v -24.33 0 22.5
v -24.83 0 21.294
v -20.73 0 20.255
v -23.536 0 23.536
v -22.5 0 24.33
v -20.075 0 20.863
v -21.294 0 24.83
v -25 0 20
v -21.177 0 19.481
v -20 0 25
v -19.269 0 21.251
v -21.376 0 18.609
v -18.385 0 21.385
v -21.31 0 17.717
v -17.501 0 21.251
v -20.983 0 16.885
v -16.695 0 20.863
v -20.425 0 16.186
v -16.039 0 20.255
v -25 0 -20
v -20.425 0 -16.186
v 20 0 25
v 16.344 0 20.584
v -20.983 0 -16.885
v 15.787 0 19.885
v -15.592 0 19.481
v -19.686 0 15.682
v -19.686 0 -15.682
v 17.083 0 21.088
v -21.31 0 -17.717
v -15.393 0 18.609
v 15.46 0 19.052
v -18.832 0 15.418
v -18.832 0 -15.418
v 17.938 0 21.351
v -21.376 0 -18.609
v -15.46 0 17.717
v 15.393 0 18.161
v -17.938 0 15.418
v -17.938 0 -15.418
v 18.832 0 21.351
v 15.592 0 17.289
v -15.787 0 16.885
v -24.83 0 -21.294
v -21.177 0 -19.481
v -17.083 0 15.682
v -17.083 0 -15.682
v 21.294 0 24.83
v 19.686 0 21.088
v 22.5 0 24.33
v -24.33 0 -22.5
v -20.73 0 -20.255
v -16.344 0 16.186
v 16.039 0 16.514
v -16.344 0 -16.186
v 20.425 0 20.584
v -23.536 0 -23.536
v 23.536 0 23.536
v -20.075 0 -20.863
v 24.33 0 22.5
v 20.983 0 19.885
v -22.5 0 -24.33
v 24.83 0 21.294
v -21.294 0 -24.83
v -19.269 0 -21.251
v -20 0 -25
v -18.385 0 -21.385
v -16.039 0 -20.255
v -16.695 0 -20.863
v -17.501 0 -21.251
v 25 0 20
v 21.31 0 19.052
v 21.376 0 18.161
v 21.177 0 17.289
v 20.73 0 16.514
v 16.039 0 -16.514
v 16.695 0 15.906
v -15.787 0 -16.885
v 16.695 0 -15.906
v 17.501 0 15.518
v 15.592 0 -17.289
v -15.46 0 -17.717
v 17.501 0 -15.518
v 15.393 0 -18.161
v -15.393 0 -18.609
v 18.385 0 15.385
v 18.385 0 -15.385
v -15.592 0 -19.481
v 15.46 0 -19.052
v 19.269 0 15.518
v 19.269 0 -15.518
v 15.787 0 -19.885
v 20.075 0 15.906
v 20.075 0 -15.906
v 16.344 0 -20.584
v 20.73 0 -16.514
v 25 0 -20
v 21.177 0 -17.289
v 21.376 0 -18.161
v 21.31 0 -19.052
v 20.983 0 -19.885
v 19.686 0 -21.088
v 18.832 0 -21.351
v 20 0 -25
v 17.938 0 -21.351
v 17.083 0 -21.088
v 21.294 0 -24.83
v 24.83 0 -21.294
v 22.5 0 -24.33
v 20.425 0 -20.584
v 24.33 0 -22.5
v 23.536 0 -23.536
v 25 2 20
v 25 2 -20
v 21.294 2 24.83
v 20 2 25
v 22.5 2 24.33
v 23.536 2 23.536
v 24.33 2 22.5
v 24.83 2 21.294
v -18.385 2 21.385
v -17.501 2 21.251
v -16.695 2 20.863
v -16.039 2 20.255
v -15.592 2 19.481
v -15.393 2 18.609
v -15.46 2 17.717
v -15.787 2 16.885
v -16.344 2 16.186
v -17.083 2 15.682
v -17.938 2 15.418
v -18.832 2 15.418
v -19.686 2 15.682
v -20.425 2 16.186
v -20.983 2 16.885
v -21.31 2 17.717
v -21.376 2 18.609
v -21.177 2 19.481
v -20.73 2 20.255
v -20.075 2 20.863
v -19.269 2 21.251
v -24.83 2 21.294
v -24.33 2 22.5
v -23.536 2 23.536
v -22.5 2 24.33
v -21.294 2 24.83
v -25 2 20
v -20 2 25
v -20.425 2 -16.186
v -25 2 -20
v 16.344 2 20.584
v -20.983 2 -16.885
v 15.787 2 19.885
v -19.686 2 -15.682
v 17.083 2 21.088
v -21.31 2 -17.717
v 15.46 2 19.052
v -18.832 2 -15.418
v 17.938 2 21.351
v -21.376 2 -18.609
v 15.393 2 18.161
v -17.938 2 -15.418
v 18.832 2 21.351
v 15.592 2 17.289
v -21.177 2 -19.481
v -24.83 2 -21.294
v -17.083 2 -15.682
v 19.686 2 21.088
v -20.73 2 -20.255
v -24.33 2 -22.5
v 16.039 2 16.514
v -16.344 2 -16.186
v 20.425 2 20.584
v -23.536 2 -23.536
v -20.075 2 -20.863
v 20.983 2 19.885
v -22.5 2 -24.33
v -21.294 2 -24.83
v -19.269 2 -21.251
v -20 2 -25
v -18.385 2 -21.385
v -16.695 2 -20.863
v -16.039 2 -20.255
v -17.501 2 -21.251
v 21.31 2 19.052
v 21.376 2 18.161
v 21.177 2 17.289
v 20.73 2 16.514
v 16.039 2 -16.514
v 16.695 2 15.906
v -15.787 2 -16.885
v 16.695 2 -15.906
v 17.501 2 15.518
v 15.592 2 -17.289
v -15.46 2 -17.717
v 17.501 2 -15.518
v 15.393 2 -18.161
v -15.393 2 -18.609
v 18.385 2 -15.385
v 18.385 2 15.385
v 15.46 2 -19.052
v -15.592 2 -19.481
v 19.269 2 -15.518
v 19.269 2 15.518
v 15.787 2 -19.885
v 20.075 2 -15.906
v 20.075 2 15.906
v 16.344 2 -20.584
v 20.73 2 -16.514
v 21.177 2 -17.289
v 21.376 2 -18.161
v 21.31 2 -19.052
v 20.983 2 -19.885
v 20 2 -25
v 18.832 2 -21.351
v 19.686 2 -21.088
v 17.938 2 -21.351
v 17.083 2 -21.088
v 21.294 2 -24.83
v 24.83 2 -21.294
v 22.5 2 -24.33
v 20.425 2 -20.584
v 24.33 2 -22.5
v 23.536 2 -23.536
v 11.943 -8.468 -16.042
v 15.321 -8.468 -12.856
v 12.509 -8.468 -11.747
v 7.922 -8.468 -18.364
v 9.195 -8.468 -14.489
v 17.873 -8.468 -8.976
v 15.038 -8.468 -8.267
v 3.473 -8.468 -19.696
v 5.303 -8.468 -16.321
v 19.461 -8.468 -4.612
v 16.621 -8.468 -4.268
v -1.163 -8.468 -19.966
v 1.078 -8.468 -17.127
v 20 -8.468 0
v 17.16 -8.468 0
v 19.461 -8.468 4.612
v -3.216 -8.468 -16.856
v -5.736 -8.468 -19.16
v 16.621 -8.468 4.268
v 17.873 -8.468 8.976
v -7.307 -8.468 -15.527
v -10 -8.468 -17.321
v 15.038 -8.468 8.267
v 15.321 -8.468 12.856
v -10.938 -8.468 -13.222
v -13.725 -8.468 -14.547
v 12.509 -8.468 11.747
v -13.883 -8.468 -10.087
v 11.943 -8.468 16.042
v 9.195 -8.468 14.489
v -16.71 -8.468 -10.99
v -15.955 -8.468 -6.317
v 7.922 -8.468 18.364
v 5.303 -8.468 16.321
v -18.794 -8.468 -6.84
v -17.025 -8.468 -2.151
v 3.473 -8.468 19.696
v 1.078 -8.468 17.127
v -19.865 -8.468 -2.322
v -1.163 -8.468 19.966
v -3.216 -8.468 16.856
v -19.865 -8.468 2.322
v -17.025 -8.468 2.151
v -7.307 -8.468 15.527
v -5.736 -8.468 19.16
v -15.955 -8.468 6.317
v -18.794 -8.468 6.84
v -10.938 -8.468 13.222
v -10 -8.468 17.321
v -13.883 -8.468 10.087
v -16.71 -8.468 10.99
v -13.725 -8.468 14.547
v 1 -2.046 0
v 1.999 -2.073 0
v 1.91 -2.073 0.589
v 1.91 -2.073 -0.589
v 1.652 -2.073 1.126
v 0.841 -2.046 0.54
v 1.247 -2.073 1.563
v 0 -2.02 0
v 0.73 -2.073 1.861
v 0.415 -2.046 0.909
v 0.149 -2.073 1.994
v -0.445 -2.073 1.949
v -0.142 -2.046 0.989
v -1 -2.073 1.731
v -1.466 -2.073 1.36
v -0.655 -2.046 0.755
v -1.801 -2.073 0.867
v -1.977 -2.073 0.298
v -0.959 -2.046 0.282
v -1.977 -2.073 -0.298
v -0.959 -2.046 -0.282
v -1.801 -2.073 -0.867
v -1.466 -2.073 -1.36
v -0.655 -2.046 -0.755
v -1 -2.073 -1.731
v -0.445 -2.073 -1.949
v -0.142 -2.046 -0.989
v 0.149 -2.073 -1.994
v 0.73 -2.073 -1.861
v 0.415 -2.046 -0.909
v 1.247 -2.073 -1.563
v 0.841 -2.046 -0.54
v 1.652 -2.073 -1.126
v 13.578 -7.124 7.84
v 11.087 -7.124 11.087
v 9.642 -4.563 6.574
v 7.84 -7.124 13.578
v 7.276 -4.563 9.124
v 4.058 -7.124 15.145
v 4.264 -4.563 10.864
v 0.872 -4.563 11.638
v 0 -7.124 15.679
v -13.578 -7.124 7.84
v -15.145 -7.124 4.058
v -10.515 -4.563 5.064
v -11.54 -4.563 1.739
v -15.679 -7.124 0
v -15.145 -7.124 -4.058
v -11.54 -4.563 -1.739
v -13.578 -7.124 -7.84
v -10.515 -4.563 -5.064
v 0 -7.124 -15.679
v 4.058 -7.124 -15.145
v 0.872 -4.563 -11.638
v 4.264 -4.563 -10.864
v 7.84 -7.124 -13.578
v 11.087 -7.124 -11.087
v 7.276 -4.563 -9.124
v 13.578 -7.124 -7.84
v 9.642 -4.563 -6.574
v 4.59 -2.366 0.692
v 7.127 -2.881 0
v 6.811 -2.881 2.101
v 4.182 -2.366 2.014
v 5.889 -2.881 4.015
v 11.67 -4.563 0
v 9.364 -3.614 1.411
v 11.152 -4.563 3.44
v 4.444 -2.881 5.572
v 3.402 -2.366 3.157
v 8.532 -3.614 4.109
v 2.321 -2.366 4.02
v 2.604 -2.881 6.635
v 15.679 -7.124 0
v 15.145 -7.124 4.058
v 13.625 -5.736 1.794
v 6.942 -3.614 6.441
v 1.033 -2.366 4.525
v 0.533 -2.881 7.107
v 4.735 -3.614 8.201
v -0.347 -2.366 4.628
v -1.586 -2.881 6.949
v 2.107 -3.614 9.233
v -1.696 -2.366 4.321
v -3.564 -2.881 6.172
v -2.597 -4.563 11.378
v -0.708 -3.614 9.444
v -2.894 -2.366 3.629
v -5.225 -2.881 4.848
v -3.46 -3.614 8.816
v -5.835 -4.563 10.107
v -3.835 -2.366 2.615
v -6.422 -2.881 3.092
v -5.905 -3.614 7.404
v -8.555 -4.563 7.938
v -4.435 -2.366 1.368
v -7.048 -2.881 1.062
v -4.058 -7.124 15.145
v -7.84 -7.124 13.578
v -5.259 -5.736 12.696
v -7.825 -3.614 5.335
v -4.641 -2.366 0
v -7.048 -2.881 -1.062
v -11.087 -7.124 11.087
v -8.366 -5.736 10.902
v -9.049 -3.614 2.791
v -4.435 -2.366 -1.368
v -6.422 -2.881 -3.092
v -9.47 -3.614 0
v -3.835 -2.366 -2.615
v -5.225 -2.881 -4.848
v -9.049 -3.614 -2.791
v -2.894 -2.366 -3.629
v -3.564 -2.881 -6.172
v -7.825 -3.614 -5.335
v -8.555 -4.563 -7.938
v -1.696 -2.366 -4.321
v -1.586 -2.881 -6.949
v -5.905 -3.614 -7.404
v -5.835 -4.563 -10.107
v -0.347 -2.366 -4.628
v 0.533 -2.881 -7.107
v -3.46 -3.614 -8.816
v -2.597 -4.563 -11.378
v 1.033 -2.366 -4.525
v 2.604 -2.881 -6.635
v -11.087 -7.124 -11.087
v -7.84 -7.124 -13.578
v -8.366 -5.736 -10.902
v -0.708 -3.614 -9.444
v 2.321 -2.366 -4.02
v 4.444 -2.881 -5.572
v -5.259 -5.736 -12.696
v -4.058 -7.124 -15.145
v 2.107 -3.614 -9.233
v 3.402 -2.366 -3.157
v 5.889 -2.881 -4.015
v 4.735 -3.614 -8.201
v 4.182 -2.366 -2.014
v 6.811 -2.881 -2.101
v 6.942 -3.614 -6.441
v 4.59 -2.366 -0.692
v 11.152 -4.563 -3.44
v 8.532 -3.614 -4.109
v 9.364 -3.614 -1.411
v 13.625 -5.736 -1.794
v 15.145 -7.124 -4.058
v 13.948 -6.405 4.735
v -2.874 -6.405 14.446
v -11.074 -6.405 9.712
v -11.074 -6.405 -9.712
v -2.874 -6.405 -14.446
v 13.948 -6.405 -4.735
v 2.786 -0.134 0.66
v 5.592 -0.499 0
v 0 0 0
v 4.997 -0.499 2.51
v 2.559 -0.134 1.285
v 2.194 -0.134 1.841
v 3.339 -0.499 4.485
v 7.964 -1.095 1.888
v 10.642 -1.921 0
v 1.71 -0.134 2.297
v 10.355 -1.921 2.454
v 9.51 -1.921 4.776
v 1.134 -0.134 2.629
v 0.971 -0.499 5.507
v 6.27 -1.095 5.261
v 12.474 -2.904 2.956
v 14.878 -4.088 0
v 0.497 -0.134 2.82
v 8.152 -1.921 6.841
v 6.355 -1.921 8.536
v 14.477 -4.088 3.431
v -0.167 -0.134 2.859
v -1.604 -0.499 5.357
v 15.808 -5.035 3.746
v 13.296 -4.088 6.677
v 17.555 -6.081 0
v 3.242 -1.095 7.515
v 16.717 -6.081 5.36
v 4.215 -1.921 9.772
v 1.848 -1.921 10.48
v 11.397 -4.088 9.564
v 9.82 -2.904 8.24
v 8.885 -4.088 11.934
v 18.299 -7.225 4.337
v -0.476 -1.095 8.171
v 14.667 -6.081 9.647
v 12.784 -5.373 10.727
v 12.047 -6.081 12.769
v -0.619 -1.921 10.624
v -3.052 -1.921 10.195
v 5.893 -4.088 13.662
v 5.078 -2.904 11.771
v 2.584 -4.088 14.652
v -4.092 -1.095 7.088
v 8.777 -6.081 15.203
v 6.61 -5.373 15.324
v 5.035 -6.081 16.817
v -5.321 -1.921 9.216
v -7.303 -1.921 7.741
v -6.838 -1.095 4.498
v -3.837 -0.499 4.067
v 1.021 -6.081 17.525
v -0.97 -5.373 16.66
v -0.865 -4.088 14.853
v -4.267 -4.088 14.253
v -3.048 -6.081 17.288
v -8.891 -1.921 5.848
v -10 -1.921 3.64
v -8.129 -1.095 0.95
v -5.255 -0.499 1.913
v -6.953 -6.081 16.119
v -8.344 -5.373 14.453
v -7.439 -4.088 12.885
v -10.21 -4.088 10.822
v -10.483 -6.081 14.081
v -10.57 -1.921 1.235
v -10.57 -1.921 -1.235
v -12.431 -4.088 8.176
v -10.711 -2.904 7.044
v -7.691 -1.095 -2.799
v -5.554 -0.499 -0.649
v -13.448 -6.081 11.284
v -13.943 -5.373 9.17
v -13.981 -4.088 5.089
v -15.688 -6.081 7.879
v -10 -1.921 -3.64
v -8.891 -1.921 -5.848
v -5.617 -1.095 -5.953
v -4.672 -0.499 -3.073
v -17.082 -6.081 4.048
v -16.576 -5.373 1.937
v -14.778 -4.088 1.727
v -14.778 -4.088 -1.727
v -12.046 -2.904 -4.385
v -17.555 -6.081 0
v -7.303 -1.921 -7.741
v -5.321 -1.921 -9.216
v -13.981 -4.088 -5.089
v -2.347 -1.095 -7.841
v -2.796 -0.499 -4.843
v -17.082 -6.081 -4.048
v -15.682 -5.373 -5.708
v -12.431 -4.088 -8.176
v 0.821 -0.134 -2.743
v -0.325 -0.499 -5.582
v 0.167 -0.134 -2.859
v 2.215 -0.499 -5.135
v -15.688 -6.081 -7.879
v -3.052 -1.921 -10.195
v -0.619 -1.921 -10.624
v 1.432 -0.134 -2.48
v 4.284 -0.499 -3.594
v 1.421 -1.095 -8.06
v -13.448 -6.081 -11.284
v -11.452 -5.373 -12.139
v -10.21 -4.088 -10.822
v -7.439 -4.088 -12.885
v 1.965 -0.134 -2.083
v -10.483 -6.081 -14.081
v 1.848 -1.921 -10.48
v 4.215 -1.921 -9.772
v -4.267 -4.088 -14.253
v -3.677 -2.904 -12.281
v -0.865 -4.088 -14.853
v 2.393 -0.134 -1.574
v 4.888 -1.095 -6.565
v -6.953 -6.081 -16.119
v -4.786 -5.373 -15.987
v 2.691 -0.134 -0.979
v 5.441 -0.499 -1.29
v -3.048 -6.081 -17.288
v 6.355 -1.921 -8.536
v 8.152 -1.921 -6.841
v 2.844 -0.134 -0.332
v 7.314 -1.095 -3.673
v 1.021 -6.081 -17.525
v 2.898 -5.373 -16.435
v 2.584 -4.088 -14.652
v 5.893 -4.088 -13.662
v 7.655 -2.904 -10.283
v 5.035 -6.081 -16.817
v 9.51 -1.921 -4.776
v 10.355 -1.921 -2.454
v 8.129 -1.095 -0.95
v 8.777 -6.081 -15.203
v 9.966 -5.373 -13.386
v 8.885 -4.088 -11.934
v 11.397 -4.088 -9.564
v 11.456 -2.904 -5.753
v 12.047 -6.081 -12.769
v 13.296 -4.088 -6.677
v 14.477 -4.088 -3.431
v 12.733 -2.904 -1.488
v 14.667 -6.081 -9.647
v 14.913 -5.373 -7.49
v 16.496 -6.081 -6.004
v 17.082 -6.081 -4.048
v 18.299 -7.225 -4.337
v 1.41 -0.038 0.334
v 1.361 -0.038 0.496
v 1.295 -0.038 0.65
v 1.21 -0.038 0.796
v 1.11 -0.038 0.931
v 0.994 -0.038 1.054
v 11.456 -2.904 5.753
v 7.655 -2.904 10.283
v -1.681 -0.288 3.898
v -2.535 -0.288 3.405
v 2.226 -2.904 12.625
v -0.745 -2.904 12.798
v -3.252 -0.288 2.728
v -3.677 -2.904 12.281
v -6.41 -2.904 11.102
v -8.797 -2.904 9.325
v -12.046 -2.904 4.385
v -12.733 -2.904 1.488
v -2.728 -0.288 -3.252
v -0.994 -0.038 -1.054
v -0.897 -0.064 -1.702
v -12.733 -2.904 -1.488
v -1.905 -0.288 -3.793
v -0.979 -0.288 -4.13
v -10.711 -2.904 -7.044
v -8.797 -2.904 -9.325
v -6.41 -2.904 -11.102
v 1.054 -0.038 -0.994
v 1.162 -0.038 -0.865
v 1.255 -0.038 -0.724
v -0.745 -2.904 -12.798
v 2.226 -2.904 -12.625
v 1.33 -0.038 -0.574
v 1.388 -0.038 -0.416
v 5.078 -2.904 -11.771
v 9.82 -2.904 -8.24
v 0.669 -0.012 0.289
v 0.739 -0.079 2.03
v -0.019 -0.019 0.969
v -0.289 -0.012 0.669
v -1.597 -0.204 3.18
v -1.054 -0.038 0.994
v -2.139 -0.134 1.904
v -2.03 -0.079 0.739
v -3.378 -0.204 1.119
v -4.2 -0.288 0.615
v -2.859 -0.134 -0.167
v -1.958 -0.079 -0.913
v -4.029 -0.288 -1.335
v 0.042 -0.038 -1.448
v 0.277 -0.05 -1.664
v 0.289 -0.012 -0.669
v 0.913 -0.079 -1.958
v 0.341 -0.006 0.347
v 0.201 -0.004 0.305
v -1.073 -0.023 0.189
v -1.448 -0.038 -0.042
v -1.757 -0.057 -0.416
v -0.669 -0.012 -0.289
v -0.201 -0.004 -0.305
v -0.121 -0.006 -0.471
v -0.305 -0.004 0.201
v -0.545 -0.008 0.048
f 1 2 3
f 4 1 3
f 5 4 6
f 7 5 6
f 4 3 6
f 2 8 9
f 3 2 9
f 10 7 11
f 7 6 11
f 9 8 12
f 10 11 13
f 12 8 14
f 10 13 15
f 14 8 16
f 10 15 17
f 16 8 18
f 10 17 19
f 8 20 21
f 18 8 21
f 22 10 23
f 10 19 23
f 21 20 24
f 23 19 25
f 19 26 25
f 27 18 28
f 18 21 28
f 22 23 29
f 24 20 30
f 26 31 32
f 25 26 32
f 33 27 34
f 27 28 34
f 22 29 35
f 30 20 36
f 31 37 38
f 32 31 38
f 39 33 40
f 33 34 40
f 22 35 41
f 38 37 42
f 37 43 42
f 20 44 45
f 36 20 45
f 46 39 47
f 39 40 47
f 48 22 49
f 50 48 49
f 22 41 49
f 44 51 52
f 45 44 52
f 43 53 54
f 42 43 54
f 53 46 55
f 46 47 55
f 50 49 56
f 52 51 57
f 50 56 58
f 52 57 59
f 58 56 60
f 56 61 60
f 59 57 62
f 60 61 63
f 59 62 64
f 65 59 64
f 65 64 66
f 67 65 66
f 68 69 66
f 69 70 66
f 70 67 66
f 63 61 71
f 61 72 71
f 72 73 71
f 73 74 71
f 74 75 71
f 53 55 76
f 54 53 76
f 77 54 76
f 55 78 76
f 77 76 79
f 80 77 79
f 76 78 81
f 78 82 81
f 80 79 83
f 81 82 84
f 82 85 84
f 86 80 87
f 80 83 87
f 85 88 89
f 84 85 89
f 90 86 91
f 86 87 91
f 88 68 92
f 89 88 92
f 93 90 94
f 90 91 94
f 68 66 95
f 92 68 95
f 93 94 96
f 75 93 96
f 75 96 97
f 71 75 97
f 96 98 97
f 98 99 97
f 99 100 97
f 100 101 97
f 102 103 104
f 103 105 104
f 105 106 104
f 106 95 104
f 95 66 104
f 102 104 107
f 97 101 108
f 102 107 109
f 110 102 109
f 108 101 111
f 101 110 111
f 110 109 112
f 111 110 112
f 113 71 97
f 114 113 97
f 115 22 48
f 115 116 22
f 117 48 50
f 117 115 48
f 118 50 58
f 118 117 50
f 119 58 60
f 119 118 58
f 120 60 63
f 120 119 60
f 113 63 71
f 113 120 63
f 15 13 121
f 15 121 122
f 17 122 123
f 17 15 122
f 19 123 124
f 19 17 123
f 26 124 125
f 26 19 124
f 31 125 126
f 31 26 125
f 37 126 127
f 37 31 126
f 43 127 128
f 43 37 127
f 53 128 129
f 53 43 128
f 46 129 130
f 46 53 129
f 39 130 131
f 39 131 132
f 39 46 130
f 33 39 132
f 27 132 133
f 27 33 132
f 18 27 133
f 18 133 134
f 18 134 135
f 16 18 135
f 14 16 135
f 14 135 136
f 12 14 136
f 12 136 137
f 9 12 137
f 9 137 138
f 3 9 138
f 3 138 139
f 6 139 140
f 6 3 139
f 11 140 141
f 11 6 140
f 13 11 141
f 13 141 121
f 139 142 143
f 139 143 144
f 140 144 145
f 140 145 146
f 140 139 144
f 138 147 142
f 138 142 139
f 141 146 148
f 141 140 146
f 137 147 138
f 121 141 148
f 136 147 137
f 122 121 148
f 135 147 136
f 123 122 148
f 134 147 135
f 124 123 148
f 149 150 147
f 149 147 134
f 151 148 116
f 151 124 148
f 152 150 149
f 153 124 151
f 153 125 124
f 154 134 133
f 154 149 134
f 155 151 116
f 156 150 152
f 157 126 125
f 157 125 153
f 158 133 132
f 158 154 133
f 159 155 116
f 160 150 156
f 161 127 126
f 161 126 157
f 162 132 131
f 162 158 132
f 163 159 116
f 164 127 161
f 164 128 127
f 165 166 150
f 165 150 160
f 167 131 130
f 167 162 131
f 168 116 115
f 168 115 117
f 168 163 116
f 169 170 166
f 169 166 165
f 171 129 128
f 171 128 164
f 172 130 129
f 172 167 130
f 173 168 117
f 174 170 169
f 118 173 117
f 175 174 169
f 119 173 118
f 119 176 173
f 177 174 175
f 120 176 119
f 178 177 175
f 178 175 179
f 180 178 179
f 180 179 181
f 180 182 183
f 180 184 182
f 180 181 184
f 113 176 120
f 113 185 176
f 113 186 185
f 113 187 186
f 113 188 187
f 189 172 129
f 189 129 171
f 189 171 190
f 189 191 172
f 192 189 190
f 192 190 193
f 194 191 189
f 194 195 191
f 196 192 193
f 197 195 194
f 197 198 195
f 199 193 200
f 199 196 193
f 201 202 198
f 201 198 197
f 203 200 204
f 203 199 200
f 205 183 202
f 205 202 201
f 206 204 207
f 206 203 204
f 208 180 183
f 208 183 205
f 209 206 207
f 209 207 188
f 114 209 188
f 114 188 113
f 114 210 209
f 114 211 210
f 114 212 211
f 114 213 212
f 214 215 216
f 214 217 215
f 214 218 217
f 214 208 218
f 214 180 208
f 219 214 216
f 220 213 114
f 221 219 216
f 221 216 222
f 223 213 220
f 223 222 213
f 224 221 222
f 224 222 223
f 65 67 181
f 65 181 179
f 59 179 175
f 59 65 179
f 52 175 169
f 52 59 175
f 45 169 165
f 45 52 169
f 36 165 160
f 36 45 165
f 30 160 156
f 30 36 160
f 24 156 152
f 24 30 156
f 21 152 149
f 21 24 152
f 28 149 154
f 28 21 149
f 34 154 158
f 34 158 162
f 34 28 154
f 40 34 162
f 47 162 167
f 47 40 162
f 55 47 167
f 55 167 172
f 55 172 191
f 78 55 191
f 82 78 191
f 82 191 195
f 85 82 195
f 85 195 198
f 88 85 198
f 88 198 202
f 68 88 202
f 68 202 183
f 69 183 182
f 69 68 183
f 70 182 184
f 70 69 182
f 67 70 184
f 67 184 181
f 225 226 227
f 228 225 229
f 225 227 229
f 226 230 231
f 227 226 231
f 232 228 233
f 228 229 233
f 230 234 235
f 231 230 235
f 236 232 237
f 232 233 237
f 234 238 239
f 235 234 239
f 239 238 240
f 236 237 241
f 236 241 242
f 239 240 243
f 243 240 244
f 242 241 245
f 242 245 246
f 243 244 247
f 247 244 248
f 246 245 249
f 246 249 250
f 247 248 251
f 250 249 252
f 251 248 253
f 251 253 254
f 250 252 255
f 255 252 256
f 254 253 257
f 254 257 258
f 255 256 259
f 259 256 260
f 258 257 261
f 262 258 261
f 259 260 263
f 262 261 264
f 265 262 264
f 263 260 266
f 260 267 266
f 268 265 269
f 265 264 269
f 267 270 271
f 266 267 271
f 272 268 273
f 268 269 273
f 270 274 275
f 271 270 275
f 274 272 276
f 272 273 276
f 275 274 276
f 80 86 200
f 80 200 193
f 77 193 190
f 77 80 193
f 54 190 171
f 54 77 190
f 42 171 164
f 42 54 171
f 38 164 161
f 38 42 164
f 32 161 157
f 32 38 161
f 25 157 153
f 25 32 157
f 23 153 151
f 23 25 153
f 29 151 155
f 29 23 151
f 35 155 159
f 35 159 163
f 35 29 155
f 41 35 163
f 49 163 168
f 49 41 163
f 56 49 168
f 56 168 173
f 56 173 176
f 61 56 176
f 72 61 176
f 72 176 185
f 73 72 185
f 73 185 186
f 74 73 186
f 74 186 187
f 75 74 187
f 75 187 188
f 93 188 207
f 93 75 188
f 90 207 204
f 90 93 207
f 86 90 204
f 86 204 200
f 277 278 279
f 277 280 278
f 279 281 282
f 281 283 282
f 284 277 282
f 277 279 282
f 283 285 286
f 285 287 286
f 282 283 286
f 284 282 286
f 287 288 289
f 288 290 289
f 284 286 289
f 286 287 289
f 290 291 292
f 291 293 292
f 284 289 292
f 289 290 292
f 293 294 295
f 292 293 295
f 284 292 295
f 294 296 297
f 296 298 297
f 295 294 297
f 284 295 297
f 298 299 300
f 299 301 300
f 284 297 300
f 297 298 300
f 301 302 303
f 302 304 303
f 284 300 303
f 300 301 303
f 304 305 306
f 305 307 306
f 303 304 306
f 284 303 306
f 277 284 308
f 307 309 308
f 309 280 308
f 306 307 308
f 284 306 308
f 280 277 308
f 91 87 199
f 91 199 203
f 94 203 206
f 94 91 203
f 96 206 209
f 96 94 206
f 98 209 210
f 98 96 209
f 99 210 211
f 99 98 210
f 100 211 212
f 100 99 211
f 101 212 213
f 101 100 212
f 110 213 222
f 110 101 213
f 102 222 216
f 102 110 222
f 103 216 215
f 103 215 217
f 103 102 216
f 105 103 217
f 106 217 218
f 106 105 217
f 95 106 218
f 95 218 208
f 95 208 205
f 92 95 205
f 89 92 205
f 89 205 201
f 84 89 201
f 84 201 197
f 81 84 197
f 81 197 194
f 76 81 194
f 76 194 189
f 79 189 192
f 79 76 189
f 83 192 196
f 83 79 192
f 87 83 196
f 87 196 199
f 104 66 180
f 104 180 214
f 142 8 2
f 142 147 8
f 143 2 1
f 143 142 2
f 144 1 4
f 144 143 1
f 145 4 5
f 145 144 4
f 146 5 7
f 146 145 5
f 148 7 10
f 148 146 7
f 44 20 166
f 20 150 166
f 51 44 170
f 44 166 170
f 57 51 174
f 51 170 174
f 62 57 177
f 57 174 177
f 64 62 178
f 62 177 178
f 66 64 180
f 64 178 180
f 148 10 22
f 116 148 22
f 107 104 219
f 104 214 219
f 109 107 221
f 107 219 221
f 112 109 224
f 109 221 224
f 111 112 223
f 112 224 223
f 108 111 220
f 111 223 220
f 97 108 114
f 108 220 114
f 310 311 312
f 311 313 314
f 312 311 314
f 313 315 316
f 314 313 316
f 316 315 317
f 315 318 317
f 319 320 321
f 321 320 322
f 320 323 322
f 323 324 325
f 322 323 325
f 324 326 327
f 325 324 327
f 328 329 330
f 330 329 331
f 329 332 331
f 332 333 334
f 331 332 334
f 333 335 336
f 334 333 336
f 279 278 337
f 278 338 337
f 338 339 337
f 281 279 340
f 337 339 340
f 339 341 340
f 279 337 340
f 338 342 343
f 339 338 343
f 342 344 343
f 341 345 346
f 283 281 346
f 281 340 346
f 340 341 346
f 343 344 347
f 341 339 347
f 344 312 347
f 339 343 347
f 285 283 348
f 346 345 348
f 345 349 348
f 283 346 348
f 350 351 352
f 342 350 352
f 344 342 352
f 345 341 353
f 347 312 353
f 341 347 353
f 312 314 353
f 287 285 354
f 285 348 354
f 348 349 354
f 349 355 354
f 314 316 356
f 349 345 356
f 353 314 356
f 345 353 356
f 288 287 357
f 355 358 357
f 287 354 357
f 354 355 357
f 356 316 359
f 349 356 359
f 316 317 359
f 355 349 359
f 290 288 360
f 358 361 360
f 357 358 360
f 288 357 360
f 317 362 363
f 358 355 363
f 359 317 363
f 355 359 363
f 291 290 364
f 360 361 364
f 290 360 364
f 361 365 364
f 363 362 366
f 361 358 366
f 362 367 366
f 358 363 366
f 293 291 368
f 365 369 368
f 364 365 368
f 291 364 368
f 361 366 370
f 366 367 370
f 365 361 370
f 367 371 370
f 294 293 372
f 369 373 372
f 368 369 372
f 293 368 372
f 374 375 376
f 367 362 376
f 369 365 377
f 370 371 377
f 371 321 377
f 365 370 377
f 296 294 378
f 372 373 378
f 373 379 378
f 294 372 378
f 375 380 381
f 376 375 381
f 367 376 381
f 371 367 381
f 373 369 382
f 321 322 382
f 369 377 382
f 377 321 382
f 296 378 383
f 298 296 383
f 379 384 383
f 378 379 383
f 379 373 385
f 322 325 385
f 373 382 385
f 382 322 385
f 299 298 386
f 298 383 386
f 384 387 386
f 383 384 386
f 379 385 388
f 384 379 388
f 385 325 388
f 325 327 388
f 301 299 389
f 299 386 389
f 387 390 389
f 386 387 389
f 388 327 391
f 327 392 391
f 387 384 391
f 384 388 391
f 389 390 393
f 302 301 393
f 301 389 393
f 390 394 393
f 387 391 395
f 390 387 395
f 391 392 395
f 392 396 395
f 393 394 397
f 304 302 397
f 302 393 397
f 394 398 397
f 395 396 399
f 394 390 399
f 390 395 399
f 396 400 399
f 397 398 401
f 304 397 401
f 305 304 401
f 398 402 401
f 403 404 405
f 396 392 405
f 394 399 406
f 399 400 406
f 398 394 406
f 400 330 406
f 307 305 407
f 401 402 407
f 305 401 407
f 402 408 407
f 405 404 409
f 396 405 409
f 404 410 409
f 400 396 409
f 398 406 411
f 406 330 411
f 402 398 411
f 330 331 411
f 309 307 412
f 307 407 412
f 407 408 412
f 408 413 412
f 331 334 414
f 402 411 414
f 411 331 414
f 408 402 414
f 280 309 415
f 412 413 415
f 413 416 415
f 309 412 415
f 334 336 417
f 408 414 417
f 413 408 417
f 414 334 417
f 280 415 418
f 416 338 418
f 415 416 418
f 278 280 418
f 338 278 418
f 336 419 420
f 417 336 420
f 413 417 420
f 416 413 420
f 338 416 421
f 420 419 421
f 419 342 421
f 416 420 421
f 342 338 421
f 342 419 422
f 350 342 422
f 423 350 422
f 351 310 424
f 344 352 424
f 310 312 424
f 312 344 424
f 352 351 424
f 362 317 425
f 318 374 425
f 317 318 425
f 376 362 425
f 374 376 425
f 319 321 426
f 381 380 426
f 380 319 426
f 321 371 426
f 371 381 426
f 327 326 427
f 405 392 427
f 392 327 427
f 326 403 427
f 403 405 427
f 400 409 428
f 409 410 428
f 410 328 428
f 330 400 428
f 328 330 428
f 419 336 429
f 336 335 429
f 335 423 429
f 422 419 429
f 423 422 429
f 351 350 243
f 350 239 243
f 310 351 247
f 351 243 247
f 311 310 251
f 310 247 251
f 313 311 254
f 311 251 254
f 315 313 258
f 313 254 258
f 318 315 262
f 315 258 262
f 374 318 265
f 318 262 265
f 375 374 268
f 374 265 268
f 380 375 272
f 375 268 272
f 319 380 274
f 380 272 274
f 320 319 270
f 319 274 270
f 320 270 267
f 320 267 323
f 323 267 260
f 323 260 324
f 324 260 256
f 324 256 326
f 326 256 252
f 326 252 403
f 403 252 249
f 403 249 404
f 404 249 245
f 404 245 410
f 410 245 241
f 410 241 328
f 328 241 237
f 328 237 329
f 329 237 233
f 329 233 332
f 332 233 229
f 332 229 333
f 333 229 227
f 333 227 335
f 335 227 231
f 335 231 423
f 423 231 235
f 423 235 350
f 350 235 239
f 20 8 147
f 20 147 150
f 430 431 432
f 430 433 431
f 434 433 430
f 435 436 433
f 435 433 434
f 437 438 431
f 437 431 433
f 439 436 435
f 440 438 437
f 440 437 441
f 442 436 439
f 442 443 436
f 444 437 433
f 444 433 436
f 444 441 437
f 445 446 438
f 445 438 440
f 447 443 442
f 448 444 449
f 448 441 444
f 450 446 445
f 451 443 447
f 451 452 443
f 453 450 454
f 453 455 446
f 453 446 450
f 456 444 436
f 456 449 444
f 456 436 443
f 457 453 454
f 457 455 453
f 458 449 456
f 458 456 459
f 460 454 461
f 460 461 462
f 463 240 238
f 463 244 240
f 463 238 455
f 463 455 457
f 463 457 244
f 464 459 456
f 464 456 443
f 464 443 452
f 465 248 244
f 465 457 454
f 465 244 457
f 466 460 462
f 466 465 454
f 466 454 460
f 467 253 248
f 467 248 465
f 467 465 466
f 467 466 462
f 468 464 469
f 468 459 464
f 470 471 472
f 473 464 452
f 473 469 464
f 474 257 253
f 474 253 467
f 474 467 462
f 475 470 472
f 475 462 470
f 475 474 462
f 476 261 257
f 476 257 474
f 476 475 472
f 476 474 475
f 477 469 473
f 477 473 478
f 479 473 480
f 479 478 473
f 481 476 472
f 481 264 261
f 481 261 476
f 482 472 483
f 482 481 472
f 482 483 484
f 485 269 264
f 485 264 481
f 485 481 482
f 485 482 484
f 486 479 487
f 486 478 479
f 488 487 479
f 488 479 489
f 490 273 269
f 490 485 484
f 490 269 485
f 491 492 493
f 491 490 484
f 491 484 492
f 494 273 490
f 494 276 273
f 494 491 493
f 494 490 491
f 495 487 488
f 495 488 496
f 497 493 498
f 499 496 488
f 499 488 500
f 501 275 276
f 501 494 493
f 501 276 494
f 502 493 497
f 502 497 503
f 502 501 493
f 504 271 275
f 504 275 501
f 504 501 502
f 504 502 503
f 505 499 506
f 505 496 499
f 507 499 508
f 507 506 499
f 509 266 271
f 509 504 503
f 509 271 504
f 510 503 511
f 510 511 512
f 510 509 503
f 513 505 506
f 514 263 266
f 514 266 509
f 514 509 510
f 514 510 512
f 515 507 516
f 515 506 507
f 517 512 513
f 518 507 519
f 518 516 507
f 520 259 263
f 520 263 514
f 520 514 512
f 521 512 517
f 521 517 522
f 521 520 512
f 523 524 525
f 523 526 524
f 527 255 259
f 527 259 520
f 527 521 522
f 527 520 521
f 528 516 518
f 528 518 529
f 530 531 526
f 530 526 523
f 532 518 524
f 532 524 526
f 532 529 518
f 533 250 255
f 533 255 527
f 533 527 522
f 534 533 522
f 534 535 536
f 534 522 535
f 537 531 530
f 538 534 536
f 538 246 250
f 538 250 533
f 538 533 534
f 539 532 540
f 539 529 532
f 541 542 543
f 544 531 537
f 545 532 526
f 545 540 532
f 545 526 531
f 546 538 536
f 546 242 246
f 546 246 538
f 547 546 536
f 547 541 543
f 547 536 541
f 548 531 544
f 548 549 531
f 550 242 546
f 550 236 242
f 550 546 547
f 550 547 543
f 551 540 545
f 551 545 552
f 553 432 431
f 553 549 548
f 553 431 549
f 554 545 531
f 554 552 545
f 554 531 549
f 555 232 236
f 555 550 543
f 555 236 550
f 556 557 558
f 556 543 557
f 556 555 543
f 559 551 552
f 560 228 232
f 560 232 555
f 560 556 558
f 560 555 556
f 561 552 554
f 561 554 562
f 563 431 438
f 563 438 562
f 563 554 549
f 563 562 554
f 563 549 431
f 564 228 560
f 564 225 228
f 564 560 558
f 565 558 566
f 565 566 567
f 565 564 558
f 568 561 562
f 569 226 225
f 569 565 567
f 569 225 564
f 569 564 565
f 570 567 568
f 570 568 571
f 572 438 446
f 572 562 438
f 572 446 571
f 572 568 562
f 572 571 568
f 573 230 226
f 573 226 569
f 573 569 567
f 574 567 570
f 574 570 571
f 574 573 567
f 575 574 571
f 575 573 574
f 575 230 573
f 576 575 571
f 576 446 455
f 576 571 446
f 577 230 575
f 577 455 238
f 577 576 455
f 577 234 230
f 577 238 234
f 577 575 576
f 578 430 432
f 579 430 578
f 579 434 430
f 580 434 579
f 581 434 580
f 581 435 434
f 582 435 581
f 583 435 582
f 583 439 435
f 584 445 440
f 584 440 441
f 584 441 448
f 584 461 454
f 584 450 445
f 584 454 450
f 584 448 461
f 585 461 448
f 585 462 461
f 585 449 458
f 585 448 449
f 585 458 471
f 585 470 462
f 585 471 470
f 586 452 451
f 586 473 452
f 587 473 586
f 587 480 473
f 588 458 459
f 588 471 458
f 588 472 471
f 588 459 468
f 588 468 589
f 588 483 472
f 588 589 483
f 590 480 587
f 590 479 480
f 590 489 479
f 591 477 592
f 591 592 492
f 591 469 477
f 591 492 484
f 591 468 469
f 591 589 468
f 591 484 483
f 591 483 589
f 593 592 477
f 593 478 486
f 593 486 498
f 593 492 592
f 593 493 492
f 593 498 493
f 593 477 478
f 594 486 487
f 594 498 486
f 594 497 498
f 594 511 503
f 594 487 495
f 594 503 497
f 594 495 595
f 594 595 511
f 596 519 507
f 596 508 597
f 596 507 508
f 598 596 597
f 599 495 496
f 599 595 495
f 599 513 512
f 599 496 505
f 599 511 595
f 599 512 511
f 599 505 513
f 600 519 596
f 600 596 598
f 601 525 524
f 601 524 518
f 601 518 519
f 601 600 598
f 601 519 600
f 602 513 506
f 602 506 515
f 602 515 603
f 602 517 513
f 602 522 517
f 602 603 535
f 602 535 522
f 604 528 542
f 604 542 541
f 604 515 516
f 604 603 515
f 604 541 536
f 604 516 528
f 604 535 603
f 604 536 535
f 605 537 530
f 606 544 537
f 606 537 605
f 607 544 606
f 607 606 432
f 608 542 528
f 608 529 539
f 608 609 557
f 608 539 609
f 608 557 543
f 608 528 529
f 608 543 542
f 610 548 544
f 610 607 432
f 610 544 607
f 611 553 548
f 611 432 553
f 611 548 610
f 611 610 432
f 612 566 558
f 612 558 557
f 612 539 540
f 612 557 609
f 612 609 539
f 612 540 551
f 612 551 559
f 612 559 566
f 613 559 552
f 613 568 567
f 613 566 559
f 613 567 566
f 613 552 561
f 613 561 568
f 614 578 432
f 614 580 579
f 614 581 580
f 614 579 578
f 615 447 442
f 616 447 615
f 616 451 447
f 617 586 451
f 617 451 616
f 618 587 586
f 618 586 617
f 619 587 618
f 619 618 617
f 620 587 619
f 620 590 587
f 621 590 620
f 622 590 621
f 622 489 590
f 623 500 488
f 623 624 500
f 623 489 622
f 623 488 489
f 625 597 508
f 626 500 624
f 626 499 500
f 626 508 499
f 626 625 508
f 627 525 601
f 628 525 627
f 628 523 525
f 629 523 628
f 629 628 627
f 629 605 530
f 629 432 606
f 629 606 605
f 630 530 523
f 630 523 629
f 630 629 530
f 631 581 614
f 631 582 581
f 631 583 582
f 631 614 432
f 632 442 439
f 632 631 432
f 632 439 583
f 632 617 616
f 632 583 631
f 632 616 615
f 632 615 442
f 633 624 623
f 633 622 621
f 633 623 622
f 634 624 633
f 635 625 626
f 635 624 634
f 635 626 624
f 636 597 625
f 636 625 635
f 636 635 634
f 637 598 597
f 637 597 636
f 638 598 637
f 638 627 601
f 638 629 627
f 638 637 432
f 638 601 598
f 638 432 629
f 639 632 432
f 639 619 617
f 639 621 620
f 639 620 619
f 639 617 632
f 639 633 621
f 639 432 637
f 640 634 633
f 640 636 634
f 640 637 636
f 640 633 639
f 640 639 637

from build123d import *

# Parameters (mm, degrees)
SKETCH1_W           = 50
SKETCH1_H           = 50
SKETCH1_R           = 3
BOSS_EXTRUDE1_DEPTH = 2
FILLET1_R           = 5


with BuildPart() as part:
    # Sketch1 → Boss-Extrude1 (new body)
    with BuildSketch(Plane(origin=(0, 0, 0), x_dir=(1, 0, 0), z_dir=(0, 1, 0))):
        Rectangle(SKETCH1_W, SKETCH1_H)
        with Locations(Location((18.384776311, 18.384776311, 0), (0, 0, 270))):
            Circle(SKETCH1_R, mode=Mode.SUBTRACT)
        with Locations(Location((-18.384776311, 18.384776311, 0), (0, 0, 90))):
            Circle(SKETCH1_R, mode=Mode.SUBTRACT)
        with Locations(Location((18.384776311, -18.384776311, 0), (0, 0, 90))):
            Circle(SKETCH1_R, mode=Mode.SUBTRACT)
        with Locations(Location((-18.384776311, -18.384776311, 0), (0, 0, 270))):
            Circle(SKETCH1_R, mode=Mode.SUBTRACT)
    extrude(amount=BOSS_EXTRUDE1_DEPTH)

    # Fillet1
    fillet1_edges = [part.edges().sort_by_distance(p)[0] for p in [
        (25, 1, 25),
        (-25, 1, 25),
        (-25, 1, -25),
        (25, 1, -25),
    ]]
    fillet(fillet1_edges, radius=FILLET1_R)


with BuildPart() as body_2:
    # Sketch2 → Revolve1 (revolve)
    with BuildSketch(Plane.XY):
        with BuildLine():
            Line((0, -2.019980921), (1.99930643, -2.072647775))
            add(Edge.make_bspline(
                [(1.99930643, -2.072647775), (2.666007666, -2.117291662), (4.014019168, -2.251616435), (6.549499982, -2.683388344), (9.525407915, -3.533799384), (12.765394617, -5.035648817), (14.749449818, -6.380365871), (15.679001727, -7.124399167)],
                knots=[0.08723148, 0.08723148, 0.08723148, 0.08723148, 0.177417467, 0.267603454, 0.447975427, 0.628347401, 0.808719374, 0.808719374, 0.808719374, 0.808719374], degree=3))
            Line((15.679001727, -7.124399167), (17.160402388, -8.468070288))
            Line((17.160402388, -8.468070288), (20, -8.468070288))
            add(Edge.make_bspline(
                [(0, 0), (12.43840622, -0.079628335), (20, -8.468070288)],
                knots=[0, 0, 0, 1, 1, 1], degree=2))
            Line((0, 0), (0, -2.019980921))
        make_face()
    revolve(axis=Axis((0, 10.005953766, 0), (0, -1, 0)))


solid = Compound([part.part, body_2.part])
